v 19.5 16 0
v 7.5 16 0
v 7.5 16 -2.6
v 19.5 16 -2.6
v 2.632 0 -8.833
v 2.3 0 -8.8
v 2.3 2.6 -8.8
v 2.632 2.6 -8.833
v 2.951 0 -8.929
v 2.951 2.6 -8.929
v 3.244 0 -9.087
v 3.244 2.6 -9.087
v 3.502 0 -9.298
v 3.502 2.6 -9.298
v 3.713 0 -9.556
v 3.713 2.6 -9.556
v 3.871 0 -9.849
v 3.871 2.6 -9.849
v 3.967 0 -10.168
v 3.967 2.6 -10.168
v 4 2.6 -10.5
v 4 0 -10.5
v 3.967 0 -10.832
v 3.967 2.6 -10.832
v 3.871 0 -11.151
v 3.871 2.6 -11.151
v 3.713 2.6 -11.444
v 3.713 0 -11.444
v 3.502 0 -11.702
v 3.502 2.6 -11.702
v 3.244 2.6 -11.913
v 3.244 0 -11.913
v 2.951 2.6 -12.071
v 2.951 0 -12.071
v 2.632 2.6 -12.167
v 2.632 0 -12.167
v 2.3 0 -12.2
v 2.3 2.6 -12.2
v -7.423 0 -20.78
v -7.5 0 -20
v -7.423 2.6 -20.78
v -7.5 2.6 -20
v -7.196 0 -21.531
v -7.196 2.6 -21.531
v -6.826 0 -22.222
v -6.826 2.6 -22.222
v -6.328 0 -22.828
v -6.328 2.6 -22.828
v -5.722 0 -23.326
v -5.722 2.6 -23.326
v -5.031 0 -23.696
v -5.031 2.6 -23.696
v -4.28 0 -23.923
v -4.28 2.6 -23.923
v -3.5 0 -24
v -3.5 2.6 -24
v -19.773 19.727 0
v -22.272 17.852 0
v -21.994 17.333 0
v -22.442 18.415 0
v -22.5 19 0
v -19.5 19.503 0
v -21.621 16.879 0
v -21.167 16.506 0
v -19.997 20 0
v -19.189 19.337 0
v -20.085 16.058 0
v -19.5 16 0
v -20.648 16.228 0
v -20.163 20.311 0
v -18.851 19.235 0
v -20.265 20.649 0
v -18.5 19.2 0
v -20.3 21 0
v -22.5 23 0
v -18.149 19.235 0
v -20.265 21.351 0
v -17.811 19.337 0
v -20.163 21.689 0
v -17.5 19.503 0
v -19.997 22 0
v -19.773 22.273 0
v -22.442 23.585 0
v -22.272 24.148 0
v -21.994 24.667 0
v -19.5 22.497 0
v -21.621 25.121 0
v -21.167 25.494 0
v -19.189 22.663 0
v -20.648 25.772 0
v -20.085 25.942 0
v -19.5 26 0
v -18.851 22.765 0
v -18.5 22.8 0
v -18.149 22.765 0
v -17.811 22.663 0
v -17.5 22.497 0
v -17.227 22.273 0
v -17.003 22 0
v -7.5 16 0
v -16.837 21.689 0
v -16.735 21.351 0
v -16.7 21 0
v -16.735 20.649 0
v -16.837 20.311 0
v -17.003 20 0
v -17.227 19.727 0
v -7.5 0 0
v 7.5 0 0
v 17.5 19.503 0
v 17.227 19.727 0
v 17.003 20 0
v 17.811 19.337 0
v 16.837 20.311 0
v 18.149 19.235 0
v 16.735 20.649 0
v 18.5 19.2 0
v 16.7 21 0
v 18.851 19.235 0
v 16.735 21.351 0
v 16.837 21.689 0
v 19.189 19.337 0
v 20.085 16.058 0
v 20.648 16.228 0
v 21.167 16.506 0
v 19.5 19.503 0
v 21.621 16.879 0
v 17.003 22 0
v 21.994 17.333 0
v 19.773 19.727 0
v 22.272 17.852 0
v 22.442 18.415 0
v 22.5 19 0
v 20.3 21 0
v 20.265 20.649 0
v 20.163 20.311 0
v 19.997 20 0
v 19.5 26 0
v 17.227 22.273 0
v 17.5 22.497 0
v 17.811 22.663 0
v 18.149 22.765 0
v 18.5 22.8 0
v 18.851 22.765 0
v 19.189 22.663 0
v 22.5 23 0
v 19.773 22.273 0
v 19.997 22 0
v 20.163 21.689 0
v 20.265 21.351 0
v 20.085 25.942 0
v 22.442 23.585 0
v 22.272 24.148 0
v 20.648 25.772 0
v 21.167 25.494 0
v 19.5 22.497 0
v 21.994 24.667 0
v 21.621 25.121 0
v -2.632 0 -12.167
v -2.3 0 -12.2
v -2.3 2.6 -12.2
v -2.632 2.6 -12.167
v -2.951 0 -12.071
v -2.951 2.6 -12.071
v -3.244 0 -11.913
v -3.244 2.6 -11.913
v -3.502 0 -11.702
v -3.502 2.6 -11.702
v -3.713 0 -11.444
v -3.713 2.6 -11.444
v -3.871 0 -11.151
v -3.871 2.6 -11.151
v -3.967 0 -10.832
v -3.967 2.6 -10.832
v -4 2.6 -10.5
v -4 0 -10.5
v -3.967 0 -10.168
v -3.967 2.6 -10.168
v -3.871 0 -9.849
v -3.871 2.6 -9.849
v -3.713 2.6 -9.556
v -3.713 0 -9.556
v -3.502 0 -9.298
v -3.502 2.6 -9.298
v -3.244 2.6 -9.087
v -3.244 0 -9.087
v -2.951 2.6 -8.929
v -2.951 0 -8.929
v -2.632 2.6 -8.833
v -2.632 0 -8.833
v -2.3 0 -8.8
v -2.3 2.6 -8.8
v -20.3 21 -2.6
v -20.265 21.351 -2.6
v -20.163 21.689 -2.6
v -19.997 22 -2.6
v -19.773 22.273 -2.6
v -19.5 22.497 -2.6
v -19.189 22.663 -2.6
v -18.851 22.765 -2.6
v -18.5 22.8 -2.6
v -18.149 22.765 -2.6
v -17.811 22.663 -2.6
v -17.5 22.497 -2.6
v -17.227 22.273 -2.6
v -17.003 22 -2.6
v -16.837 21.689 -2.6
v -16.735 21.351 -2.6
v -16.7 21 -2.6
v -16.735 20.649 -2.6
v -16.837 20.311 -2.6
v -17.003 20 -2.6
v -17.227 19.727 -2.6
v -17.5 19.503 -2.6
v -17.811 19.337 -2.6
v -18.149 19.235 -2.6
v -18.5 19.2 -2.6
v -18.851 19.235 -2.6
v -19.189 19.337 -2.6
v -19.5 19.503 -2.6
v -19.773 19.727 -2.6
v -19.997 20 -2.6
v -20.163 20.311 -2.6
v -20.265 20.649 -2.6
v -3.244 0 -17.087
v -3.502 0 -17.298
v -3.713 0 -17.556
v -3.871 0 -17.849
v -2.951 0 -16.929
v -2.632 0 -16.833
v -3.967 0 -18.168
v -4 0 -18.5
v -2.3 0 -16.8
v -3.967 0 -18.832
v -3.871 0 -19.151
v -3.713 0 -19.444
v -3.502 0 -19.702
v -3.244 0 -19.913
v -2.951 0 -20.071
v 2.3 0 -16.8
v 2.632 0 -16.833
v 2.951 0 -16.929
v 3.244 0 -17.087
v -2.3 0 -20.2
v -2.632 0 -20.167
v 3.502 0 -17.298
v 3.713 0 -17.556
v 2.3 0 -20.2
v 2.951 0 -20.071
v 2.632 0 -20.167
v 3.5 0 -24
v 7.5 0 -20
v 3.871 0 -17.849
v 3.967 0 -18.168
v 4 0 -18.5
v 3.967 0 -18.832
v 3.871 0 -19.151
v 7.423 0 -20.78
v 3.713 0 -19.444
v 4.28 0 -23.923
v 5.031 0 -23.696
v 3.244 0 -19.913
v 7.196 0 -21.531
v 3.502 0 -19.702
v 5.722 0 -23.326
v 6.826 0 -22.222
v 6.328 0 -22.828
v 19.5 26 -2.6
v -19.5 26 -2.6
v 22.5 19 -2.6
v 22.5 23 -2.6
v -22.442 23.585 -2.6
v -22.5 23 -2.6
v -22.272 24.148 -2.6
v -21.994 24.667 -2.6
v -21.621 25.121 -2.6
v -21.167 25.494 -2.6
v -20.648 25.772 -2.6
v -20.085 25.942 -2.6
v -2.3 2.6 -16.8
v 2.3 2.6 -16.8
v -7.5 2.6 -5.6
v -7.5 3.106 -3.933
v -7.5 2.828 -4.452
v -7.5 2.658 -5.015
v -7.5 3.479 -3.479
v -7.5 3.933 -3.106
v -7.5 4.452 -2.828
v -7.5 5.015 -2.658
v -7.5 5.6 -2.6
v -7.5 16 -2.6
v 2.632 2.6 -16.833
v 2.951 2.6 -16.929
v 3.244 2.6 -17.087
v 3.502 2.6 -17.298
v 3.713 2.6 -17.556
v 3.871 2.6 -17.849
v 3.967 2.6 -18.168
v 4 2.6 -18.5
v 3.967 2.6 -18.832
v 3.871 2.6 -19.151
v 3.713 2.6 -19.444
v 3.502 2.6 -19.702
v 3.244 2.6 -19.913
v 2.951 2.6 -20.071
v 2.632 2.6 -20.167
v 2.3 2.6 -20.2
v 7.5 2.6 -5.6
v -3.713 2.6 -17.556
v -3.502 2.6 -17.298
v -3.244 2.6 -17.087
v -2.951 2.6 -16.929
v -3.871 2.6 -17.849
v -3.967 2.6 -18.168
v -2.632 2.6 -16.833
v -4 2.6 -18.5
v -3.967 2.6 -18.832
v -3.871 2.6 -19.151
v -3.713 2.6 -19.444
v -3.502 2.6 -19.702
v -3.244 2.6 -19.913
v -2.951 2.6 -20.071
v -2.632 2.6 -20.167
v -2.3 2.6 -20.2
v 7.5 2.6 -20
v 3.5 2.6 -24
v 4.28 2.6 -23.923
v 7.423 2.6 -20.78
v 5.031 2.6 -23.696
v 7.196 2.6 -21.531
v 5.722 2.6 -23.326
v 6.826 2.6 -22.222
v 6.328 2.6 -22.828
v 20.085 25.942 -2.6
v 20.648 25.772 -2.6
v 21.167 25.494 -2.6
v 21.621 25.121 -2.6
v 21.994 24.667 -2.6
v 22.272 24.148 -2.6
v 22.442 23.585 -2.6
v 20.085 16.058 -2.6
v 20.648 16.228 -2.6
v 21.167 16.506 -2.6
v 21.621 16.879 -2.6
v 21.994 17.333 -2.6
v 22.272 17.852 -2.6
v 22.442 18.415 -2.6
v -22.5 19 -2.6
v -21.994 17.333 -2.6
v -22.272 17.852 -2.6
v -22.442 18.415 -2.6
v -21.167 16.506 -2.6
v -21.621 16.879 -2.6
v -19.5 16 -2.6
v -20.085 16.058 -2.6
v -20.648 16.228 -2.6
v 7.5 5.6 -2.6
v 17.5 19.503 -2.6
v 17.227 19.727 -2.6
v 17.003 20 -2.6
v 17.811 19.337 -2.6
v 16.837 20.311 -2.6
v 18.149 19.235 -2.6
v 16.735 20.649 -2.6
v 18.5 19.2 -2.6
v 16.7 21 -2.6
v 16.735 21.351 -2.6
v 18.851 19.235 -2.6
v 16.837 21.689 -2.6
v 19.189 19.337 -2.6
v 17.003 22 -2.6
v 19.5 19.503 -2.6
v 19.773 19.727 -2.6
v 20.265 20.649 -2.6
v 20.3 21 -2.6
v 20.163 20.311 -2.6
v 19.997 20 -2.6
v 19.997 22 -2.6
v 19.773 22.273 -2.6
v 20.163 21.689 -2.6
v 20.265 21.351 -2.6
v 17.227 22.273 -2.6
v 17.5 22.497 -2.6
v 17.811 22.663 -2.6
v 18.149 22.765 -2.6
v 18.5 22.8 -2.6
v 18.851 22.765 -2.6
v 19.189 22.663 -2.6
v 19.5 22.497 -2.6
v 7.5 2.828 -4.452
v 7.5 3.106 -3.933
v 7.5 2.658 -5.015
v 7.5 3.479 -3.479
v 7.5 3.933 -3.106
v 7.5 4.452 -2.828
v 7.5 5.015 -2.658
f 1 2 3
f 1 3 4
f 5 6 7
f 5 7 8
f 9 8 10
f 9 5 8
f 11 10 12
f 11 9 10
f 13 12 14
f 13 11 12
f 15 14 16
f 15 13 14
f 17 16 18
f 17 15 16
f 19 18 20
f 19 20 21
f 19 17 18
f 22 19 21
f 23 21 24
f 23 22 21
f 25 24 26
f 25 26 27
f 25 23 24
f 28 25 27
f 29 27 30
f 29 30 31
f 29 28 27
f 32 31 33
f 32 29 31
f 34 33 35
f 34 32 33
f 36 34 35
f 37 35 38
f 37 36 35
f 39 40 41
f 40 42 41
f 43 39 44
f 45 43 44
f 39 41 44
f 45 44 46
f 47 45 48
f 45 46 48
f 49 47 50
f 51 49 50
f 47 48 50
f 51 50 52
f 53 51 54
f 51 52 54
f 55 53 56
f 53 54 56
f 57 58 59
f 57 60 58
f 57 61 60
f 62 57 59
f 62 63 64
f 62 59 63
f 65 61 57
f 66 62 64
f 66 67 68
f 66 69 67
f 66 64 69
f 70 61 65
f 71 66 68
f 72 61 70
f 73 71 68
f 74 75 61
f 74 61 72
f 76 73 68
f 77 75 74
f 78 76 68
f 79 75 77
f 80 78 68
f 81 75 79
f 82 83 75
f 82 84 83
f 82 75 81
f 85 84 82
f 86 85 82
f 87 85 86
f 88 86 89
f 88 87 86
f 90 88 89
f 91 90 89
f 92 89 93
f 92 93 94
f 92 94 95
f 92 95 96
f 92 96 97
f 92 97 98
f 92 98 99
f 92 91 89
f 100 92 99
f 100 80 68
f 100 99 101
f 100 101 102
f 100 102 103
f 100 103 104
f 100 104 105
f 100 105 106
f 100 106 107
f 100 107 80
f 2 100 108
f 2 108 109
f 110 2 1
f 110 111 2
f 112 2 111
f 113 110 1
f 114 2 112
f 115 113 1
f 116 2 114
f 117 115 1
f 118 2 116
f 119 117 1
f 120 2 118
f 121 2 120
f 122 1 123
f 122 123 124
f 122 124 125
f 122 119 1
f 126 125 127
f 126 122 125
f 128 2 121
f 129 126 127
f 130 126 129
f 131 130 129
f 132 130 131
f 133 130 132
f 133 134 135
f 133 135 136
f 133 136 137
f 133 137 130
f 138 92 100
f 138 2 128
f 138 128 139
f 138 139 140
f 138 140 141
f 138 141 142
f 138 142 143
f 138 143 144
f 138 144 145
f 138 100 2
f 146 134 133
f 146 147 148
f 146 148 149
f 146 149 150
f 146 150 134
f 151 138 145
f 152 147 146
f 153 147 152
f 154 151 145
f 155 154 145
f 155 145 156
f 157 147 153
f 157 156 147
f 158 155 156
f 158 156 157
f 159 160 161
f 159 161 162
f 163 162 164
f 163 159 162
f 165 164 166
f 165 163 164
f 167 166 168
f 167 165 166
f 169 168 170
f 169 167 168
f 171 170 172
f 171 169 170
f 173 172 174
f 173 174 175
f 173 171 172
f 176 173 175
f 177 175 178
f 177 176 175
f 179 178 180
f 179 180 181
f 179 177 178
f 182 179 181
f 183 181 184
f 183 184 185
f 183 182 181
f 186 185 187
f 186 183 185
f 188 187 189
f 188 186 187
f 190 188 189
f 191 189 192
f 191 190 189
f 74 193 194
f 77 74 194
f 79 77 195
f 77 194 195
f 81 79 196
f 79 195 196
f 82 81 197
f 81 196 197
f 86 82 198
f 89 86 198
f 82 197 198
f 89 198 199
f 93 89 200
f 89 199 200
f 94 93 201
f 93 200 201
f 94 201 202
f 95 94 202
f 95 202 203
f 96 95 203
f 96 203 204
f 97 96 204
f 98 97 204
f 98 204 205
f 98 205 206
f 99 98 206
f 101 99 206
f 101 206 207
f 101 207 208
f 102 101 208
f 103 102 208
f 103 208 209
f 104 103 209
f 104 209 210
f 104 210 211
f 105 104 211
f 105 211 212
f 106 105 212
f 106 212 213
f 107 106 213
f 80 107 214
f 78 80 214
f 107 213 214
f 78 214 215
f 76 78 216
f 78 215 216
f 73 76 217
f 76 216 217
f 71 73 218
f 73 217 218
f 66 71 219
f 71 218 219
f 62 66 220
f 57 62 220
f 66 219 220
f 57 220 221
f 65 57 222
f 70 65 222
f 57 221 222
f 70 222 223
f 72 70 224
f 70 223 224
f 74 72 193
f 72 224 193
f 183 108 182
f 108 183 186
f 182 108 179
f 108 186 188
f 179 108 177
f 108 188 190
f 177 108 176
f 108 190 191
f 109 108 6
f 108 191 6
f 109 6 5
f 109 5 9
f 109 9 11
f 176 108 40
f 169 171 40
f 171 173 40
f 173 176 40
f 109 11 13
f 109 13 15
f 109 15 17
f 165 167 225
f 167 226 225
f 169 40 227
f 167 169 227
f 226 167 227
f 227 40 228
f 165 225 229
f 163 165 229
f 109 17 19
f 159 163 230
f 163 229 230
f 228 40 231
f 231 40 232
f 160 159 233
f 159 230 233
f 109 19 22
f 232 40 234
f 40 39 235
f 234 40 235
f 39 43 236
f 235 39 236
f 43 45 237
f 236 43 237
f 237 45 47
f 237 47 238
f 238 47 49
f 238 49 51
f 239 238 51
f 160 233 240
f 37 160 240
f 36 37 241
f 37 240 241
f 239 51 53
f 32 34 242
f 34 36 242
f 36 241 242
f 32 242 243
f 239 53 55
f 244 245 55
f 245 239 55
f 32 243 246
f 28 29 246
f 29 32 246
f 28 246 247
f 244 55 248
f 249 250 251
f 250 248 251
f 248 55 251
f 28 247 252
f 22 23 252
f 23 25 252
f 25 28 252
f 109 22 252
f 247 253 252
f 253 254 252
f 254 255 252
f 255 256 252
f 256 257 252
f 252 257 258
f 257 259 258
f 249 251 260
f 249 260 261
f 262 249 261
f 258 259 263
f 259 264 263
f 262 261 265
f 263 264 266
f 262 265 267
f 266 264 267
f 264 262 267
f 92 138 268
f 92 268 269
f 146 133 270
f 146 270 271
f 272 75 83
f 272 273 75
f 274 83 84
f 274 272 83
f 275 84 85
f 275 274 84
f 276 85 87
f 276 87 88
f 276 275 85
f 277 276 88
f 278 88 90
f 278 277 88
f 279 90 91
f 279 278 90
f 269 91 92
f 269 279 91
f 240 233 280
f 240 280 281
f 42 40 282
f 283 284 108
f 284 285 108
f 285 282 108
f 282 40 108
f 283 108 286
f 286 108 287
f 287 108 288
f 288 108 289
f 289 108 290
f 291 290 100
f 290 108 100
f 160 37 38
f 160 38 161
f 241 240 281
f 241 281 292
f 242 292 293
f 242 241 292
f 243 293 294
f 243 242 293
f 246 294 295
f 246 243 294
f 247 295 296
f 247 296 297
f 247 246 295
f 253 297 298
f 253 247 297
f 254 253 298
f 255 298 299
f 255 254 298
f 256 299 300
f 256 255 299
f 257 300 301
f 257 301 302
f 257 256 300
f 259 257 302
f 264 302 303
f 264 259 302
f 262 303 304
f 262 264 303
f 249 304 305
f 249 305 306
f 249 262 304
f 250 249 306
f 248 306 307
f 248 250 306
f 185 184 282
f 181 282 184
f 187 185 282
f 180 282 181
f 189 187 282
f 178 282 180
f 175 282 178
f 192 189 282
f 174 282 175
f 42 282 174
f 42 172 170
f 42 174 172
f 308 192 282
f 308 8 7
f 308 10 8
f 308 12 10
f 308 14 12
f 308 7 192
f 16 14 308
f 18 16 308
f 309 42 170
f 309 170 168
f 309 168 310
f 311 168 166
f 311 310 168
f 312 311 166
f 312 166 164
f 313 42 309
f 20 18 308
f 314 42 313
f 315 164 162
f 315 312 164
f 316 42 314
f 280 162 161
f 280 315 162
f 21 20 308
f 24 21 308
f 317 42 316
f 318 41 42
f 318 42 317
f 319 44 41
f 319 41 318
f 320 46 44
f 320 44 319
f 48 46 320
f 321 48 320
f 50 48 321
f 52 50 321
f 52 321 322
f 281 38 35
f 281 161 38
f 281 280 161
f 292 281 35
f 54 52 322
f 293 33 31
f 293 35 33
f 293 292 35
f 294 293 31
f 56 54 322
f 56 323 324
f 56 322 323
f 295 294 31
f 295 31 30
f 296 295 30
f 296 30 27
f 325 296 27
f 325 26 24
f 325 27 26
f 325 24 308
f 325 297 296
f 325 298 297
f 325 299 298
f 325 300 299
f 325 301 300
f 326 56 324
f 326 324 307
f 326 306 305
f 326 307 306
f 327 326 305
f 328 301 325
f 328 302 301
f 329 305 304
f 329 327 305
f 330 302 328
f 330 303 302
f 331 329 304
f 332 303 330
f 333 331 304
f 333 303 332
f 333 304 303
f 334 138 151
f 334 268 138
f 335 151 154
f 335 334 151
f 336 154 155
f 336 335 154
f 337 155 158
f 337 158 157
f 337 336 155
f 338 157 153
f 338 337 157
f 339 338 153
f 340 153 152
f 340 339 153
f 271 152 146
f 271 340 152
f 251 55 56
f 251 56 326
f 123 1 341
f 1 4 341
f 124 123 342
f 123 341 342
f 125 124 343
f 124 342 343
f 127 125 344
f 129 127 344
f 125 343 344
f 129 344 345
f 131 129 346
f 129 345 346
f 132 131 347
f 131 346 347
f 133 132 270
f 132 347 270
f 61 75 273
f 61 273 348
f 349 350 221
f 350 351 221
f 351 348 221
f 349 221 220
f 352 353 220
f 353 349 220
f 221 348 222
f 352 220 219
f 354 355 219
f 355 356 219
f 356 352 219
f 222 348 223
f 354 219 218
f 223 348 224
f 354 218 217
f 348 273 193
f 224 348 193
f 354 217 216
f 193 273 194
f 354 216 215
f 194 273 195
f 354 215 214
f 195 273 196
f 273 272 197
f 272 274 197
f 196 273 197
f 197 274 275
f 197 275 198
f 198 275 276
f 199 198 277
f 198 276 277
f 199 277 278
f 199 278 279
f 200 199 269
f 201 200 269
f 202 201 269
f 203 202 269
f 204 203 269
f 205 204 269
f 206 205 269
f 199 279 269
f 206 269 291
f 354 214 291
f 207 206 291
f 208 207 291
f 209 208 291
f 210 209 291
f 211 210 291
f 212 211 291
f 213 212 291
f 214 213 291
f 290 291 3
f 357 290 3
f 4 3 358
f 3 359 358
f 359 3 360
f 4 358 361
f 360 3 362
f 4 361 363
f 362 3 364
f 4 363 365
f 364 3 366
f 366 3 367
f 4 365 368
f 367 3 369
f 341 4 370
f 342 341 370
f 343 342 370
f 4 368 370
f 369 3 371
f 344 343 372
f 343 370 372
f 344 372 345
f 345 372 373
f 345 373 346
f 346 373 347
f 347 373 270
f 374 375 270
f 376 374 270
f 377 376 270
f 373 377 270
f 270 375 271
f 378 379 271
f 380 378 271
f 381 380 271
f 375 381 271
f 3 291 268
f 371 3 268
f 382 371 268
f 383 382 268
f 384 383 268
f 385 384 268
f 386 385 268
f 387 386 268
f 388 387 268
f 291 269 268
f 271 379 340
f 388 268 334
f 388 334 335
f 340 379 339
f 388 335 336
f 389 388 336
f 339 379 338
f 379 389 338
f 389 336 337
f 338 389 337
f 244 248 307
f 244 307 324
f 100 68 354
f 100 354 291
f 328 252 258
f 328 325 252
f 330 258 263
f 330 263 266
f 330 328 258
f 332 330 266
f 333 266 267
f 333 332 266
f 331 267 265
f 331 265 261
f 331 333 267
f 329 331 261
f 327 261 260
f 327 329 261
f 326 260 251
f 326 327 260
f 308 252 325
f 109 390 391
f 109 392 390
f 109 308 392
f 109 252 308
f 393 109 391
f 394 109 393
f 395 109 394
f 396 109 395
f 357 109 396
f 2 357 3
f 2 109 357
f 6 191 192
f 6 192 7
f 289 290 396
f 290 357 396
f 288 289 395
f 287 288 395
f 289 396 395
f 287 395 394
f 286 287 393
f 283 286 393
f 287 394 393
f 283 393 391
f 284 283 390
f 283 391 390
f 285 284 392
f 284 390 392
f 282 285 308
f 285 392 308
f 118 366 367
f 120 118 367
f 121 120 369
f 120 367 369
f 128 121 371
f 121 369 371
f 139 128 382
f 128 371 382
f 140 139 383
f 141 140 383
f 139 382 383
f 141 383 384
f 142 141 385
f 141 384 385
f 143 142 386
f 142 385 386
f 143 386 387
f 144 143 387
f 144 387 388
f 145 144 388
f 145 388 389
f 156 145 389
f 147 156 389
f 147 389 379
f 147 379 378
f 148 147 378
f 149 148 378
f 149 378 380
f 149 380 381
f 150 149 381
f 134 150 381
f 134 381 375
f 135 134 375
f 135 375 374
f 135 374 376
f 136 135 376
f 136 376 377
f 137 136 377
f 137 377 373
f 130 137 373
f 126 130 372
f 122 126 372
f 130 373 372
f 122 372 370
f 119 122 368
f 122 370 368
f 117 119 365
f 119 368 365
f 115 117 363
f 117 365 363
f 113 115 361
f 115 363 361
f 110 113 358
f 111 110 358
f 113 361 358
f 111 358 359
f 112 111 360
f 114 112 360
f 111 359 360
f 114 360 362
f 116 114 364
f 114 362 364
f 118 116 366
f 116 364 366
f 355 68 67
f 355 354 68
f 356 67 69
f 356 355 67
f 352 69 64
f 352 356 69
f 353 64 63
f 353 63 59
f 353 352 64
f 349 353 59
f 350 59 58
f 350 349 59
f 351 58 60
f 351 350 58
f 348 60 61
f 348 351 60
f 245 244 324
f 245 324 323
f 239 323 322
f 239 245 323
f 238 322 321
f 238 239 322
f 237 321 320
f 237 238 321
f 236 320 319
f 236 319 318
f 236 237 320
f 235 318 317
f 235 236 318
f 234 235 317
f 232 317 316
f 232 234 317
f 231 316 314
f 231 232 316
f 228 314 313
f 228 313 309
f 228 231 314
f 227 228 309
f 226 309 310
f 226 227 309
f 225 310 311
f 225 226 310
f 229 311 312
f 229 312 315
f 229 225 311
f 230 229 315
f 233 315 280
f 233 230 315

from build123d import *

# Parameters (mm, degrees)
SKETCH_2_W             = 15
SKETCH_2_H             = 24
EXTRUDE_1_DEPTH        = 2.6
SKETCH_5_W             = 15
SKETCH_5_H             = 13.4
EXTRUDE_2_DEPTH        = 2.6
FILLET_1_R             = 4
HOLE_WIZARD_M3_3_D     = 3.6
HOLE_WIZARD_M3_3_DEPTH = 32.75
HOLE_WIZARD_M3_3_TIP   = 1.081549114
FILLET_2_R             = 3
FILLET_3_R             = 3
HOLE_WIZARD_M3_5_DEPTH = 2.6


# Read off the part's stored shape, not the designer's step: M3 间隙槽口5
with BuildPart() as part:
    # 草图2 → 凸台-拉伸1 (new body)
    with BuildSketch(Plane(origin=(0, 0, 0), x_dir=(1, 0, 0), z_dir=(0, 1, 0))):
        with Locations((0, 12)):
            Rectangle(SKETCH_2_W, SKETCH_2_H)
    extrude(amount=EXTRUDE_1_DEPTH)

    # 草图5 → 凸台-拉伸2 (add)
    with BuildSketch(Plane.XY):
        with Locations((0, 9.3)):
            Rectangle(SKETCH_5_W, SKETCH_5_H)
        Polygon((-22.5, 16), (-7.5, 16), (7.5, 16), (22.5, 16), (22.5, 26), (-22.5, 26), align=None)
    extrude(amount=-EXTRUDE_2_DEPTH)

    # 圆角1
    fillet_1_edges = [part.edges().sort_by_distance(p)[0] for p in [
        (-7.5, 1.3, -24),
        (7.5, 1.3, -24),
    ]]
    fillet(fillet_1_edges, radius=FILLET_1_R)

    # M3 间隙槽口3
    with Locations(Plane.XY):
        with Locations((-18.5, 21), (18.5, 21)):
            Hole(HOLE_WIZARD_M3_3_D / 2, depth=HOLE_WIZARD_M3_3_DEPTH)
            with Locations((0, 0, -(HOLE_WIZARD_M3_3_DEPTH + HOLE_WIZARD_M3_3_TIP / 2))):  # 118° drill point
                Cone(0, HOLE_WIZARD_M3_3_D / 2, HOLE_WIZARD_M3_3_TIP, mode=Mode.SUBTRACT)

    # 圆角2
    fillet_2_edges = [part.edges().sort_by_distance(p)[0] for p in [
        (-22.5, 16, -1.3),
        (-22.5, 26, -1.3),
        (22.5, 26, -1.3),
        (22.5, 16, -1.3),
    ]]
    fillet(fillet_2_edges, radius=FILLET_2_R)

    # 圆角3
    fillet_3_edges = [part.edges().sort_by_distance(p)[0] for p in [
        (0, 2.6, -2.6),
    ]]
    fillet(fillet_3_edges, radius=FILLET_3_R)

    # M3 间隙槽口5 outline → M3 间隙槽口5 (cut)
    with BuildSketch(Plane(origin=(0, 0, 0), x_dir=(1, 0, 0), z_dir=(0, 1, 0))):
        with BuildLine():
            ThreePointArc((2.3, 8.8), (4, 10.5), (2.3, 12.2))
            Line((2.3, 12.2), (-2.3, 12.2))
            ThreePointArc((-2.3, 12.2), (-4, 10.5), (-2.3, 8.8))
            Line((-2.3, 8.8), (2.3, 8.8))
        make_face()
        with BuildLine():
            Line((-2.3, 16.8), (2.3, 16.8))
            ThreePointArc((2.3, 16.8), (4, 18.5), (2.3, 20.2))
            Line((2.3, 20.2), (-2.3, 20.2))
            ThreePointArc((-2.3, 20.2), (-4, 18.5), (-2.3, 16.8))
        make_face()
    extrude(amount=HOLE_WIZARD_M3_5_DEPTH, mode=Mode.SUBTRACT)


solid = part.part
